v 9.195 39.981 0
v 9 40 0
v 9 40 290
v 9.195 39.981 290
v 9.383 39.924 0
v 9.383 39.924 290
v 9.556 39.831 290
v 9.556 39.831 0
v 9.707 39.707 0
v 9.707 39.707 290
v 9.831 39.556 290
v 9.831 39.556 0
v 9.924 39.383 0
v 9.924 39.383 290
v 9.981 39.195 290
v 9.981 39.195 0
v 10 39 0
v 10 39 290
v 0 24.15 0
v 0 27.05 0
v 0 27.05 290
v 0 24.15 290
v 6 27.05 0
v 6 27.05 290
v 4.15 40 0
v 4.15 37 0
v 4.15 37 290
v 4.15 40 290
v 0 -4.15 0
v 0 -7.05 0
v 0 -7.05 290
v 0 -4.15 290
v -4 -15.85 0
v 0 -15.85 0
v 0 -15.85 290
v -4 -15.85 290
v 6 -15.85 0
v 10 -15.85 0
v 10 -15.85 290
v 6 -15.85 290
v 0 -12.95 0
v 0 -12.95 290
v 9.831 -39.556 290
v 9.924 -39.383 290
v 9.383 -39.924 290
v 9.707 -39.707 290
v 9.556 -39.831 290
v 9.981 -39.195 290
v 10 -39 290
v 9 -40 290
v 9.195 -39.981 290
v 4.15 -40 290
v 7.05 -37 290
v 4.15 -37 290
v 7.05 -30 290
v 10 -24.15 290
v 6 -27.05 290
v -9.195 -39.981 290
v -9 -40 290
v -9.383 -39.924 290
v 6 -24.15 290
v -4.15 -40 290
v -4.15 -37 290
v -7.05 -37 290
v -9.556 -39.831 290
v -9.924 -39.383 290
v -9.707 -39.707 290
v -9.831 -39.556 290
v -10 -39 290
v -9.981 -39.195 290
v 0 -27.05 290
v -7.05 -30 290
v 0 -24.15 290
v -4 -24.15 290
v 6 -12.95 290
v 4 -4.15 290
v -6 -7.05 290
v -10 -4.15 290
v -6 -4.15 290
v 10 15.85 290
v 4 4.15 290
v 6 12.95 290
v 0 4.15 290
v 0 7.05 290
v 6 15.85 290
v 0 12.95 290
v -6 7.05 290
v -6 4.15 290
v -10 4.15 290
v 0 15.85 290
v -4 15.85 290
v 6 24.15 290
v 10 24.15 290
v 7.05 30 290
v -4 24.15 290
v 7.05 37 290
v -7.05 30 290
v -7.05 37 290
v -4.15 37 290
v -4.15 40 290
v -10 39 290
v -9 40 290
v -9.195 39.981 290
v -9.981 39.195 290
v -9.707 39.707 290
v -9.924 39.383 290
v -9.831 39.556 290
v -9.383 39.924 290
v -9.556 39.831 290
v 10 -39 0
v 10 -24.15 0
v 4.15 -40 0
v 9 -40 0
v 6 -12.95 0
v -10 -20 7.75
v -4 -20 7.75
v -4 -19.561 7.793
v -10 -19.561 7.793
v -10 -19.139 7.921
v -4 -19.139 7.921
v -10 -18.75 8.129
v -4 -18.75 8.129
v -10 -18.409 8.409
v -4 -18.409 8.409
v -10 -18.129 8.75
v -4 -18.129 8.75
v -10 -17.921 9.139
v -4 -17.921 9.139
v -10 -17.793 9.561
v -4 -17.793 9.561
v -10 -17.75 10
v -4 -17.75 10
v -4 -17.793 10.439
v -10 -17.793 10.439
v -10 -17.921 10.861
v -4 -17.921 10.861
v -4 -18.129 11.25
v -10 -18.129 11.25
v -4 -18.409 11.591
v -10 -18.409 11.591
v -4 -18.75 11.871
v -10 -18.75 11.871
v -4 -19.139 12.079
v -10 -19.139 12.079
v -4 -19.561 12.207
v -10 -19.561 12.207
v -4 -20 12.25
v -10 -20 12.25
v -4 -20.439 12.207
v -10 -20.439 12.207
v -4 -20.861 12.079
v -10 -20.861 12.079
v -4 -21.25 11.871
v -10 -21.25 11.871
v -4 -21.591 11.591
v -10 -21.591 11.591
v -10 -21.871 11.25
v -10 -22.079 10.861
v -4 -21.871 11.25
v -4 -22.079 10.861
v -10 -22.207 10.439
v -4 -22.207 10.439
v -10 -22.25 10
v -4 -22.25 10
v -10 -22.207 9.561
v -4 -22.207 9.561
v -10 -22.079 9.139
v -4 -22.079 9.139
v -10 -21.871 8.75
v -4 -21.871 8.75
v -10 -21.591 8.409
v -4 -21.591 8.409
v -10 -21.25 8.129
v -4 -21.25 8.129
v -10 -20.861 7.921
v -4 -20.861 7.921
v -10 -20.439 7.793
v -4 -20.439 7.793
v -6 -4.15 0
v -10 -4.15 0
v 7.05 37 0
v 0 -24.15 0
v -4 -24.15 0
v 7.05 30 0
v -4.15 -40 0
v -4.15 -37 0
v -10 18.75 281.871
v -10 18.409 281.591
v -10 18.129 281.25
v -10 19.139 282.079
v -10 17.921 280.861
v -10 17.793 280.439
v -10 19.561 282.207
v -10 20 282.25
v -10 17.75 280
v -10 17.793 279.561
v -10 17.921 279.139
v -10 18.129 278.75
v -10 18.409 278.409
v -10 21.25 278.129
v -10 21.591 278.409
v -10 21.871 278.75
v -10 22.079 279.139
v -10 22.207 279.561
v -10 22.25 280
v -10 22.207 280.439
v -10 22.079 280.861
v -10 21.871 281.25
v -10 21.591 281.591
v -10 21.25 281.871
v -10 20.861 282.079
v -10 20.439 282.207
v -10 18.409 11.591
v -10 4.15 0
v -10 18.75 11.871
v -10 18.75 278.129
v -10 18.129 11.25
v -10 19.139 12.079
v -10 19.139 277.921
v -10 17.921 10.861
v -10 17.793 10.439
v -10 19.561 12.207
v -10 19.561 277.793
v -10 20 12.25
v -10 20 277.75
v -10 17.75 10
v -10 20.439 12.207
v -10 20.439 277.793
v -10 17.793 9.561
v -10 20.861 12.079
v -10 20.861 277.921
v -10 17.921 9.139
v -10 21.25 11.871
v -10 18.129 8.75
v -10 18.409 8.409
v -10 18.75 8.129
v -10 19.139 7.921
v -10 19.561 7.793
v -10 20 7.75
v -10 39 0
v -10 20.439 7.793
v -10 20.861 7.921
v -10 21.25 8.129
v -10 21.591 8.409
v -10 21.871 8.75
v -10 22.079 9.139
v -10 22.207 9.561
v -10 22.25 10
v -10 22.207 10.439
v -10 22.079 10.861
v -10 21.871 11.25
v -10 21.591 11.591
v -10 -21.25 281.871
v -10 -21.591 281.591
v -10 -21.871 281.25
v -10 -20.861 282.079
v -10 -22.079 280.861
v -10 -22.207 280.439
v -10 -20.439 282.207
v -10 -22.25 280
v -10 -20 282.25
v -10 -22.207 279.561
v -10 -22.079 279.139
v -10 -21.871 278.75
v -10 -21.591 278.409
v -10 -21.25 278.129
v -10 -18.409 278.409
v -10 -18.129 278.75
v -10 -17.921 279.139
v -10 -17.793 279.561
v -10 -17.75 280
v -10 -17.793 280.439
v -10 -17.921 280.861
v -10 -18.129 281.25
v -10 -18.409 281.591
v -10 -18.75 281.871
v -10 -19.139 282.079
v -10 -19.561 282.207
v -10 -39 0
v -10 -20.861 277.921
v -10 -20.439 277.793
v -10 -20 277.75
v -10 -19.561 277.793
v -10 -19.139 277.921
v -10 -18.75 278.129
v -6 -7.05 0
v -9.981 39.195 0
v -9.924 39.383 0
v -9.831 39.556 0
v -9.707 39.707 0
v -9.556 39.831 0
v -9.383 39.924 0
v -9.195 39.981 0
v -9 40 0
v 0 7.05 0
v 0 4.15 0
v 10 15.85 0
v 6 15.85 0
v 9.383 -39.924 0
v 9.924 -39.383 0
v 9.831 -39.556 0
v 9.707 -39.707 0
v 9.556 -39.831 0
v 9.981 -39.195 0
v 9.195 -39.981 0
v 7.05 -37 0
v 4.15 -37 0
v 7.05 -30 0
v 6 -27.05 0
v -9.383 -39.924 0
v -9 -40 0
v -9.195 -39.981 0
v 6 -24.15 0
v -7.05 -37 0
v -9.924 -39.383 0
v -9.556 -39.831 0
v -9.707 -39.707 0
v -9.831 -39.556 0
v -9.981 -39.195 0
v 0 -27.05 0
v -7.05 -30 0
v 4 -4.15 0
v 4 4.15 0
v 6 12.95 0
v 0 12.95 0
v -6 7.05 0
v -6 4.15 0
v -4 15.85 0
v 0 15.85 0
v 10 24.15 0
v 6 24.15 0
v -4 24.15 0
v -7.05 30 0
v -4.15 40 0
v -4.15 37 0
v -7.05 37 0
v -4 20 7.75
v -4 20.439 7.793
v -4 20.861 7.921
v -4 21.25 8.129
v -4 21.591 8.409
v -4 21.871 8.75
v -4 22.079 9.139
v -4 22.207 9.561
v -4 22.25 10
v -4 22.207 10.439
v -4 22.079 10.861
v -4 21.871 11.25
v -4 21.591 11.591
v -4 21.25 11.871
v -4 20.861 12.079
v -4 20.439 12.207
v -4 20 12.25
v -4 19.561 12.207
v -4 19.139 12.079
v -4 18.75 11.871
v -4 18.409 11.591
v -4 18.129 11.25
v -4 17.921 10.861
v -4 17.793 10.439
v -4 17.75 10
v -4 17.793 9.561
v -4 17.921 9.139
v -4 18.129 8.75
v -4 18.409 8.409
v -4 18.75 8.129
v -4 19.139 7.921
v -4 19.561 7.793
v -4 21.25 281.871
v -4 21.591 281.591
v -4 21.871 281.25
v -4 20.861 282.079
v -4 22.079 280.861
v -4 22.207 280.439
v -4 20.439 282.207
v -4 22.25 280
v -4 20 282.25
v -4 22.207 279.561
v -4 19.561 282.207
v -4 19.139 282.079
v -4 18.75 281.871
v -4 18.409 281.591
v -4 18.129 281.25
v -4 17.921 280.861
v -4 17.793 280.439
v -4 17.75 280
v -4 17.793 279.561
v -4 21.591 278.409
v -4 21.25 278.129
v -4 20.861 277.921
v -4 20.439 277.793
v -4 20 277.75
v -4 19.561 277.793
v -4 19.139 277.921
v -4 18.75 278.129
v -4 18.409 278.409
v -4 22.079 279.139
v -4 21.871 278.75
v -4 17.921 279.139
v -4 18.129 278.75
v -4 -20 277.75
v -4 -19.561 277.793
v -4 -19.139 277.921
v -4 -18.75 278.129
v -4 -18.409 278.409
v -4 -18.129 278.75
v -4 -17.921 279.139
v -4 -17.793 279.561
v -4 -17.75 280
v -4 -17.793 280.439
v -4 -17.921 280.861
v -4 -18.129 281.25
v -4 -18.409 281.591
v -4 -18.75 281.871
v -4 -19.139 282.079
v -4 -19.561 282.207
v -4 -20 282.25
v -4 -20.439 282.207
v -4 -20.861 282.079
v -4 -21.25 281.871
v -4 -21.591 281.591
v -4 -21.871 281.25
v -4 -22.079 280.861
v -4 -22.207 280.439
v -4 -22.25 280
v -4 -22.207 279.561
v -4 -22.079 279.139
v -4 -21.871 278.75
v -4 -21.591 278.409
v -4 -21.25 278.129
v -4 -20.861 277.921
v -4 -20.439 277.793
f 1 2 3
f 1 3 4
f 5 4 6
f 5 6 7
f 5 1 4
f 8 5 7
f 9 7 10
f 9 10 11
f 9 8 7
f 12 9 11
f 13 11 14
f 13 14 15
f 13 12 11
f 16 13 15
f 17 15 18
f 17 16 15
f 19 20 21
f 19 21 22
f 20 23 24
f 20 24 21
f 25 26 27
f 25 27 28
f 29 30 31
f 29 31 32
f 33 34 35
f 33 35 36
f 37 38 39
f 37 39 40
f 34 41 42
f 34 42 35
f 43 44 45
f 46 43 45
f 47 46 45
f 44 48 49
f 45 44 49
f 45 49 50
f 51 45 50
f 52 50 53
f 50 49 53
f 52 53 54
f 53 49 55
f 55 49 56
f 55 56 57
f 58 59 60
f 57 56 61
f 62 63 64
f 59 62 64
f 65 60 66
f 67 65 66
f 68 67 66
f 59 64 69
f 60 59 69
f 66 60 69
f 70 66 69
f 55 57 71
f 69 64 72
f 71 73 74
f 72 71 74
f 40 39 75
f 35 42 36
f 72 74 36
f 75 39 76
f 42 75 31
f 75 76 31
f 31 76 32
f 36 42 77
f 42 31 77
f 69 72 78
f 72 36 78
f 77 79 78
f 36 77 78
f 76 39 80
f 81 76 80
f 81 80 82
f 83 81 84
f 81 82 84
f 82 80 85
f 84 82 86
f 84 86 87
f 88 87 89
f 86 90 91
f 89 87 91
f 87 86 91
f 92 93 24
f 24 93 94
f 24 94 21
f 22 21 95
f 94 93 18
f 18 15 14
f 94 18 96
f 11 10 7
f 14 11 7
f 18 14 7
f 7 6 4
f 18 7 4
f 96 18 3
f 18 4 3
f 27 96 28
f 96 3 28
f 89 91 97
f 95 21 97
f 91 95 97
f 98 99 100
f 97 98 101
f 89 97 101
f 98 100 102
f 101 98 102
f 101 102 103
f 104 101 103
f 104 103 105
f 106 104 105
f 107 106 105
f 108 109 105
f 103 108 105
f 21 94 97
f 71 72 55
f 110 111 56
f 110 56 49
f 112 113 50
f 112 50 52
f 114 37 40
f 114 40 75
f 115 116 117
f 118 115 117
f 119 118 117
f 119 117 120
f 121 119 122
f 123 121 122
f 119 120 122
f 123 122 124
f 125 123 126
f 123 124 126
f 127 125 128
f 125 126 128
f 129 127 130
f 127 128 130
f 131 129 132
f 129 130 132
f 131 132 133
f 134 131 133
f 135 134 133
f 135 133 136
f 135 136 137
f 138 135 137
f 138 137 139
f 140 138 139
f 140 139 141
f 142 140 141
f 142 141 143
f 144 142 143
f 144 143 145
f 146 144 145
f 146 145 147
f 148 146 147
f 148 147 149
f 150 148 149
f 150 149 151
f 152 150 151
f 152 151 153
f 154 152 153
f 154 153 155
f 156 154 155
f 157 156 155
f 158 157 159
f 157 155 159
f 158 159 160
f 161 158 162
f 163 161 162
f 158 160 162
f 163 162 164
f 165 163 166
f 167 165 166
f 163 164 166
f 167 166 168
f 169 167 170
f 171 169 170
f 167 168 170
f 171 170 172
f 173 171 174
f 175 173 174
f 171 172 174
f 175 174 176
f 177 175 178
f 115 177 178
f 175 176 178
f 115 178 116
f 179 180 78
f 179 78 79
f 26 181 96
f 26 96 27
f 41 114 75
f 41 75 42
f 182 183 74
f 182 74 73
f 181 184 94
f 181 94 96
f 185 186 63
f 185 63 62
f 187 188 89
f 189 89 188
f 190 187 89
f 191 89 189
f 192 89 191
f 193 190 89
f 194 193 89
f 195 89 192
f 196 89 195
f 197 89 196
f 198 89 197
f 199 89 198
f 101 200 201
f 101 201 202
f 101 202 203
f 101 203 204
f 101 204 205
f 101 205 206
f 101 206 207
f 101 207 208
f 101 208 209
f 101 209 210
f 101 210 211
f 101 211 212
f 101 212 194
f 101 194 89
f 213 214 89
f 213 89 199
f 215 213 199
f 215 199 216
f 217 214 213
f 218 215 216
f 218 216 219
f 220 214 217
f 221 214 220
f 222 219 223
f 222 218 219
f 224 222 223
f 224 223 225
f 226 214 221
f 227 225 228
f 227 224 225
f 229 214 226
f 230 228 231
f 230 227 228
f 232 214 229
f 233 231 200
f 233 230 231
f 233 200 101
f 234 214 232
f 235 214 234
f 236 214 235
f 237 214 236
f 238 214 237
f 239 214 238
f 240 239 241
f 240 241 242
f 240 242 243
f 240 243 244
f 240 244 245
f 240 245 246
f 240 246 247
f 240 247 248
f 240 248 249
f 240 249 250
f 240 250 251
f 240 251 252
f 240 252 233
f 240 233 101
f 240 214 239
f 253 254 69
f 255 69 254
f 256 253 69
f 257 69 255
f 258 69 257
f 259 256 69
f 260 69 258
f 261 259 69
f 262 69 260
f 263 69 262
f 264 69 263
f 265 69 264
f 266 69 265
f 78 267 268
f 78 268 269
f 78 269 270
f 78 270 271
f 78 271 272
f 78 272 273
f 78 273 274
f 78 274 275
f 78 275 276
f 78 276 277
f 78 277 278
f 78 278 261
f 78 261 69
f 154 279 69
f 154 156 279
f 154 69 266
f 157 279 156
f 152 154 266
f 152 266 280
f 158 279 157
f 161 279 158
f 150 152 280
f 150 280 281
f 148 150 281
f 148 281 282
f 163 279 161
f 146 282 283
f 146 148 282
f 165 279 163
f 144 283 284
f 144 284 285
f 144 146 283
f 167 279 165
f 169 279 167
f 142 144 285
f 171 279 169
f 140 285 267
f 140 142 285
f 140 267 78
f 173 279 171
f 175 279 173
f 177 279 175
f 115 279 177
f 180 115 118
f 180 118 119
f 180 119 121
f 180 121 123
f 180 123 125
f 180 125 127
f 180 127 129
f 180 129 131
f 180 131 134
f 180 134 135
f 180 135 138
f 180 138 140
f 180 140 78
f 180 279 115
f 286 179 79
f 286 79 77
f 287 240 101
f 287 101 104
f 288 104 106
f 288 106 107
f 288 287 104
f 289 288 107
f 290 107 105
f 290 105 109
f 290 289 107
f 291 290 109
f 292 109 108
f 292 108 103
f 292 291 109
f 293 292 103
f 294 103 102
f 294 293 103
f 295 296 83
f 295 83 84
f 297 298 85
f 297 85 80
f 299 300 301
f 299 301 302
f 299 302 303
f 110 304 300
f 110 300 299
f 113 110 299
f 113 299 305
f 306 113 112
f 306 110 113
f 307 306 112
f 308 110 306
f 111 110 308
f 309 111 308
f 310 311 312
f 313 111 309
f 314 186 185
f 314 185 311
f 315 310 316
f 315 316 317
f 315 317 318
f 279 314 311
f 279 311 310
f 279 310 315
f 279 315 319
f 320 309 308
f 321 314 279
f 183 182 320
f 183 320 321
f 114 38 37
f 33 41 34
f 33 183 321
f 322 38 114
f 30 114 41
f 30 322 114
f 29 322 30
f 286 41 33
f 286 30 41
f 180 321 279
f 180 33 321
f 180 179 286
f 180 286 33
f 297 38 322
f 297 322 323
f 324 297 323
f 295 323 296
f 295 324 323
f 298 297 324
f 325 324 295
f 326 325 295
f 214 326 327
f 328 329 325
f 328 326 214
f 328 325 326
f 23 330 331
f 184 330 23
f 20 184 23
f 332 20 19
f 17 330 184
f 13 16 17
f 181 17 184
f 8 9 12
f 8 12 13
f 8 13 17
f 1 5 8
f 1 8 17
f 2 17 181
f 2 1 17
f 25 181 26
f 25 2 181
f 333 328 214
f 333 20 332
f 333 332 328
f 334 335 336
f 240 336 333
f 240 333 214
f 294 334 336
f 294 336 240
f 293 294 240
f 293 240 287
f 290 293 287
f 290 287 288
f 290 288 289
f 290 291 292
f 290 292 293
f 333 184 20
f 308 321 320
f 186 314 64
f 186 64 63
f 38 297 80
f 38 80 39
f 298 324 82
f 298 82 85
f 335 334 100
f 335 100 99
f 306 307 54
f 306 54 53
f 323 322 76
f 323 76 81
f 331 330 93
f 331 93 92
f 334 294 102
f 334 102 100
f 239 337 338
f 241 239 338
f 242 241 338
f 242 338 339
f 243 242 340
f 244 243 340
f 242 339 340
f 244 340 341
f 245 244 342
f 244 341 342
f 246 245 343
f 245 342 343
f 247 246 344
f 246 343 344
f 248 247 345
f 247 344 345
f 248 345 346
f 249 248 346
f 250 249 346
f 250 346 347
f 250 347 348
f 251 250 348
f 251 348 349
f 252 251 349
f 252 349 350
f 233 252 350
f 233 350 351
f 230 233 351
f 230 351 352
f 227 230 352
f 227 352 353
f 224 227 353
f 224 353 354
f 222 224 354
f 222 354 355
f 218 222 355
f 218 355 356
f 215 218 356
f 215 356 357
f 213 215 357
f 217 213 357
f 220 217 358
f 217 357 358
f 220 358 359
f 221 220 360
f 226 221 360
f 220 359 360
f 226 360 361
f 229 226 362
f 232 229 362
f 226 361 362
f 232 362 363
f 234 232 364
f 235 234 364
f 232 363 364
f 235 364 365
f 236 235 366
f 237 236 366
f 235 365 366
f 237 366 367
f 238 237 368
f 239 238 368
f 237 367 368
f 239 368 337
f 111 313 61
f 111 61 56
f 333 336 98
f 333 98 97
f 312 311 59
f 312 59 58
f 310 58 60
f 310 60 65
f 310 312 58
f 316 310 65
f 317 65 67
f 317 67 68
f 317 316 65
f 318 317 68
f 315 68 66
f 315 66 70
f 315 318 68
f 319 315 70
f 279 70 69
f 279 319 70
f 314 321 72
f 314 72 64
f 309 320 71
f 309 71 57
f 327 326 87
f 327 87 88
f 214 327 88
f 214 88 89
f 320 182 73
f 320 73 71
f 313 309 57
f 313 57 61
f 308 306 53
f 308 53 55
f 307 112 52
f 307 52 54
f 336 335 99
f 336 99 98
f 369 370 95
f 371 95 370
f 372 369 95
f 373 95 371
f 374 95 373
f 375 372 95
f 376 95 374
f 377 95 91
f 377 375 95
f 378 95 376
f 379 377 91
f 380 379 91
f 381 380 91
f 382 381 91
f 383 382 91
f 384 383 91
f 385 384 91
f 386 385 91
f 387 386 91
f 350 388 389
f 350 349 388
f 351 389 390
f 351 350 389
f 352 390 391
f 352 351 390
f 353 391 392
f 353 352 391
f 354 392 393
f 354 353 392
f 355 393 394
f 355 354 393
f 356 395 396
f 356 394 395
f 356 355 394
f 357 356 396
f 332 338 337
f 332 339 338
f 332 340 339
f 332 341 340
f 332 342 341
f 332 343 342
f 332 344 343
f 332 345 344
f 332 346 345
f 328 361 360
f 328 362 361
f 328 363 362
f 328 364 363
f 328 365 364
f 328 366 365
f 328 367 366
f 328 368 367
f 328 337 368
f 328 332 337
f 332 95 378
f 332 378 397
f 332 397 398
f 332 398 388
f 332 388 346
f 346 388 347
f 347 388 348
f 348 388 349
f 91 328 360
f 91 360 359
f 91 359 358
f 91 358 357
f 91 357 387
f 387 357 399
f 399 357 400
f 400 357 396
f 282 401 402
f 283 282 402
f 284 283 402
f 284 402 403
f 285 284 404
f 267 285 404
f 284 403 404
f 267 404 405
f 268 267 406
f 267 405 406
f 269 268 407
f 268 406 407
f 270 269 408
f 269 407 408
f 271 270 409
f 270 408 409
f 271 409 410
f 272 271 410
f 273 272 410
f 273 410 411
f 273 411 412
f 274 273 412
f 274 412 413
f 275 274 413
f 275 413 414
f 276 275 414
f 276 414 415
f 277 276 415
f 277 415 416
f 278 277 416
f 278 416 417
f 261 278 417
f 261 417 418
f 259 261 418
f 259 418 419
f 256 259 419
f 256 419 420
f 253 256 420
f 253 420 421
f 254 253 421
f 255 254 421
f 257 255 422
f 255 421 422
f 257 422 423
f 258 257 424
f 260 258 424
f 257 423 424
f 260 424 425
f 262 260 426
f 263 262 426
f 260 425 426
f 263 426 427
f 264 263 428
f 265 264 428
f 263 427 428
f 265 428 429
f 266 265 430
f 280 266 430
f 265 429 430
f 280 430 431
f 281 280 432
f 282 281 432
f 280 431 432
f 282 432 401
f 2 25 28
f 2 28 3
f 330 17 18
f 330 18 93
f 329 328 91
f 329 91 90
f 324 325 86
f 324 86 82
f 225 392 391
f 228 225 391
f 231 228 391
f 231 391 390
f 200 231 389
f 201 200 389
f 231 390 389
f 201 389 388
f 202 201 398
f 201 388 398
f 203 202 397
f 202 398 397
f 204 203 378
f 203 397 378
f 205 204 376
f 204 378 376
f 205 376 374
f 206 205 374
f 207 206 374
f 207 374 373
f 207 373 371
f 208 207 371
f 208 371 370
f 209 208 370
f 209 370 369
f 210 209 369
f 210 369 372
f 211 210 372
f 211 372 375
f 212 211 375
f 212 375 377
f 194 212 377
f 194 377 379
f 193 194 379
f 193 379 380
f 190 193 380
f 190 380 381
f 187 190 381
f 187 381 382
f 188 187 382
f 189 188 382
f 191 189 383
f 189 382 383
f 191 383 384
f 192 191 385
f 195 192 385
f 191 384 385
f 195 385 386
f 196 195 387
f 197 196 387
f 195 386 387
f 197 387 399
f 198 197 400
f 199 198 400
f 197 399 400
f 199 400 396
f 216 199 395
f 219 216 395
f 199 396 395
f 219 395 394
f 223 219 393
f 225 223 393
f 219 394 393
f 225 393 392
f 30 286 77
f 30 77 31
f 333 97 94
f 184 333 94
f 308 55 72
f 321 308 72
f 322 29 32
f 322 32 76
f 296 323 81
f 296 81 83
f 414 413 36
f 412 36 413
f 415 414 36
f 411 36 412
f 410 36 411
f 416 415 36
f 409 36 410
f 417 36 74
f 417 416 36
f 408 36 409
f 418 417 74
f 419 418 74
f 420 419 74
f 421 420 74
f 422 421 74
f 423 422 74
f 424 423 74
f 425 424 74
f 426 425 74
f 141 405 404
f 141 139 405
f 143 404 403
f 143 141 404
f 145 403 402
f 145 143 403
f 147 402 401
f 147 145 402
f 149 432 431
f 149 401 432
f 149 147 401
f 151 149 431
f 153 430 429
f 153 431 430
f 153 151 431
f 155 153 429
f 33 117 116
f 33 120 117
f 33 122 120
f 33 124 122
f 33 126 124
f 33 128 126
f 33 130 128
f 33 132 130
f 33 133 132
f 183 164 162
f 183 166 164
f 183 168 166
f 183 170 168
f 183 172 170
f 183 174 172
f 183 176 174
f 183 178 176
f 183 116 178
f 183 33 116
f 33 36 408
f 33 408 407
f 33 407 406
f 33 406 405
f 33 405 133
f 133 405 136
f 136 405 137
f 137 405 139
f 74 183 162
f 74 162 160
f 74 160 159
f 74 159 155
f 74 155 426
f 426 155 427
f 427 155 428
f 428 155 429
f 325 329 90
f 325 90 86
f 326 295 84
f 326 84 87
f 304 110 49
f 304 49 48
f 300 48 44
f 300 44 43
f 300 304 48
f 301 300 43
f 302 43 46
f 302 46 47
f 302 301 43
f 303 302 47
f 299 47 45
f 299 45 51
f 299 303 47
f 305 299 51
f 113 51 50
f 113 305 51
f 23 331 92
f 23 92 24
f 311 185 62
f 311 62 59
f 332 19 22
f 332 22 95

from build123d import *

# Parameters (mm, degrees)
EXTRUDE_1_DEPTH         = 290
HOLE_WIZARD_4_5_4_5_1_D = 4.5
HOLE_WIZARD_4_5_4_5_2_D = 4.5
HOLE_WIZARD_4_5_4_5_3_D = 4.5
HOLE_WIZARD_4_5_4_5_4_D = 4.5


with BuildPart() as part:
    # Sketch1 → 凸台-拉伸1 (new body)
    with BuildSketch(Plane.XY):
        with BuildLine():
            Line((-9, 40), (-4.15, 40))
            Line((-4.15, 40), (-4.15, 37))
            Line((-4.15, 37), (-7.05, 37))
            Line((-7.05, 37), (-7.05, 30))
            Line((-7.05, 30), (7.05, 30))
            Line((7.05, 30), (7.05, 37))
            Line((7.05, 37), (4.15, 37))
            Line((4.15, 37), (4.15, 40))
            Line((4.15, 40), (9, 40))
            ThreePointArc((9, 40), (9.707106781, 39.707106781), (10, 39))
            Line((10, 39), (10, 24.15))
            Line((10, 24.15), (6, 24.15))
            Line((6, 24.15), (6, 27.05))
            Line((6, 27.05), (0, 27.05))
            Line((0, 27.05), (0, 24.15))
            Line((0, 24.15), (-4, 24.15))
            Line((-4, 24.15), (-4, 15.85))
            Line((-4, 15.85), (0, 15.85))
            Line((0, 15.85), (0, 12.95))
            Line((0, 12.95), (6, 12.95))
            Line((6, 12.95), (6, 15.85))
            Line((6, 15.85), (10, 15.85))
            Line((10, 15.85), (10, -15.85))
            Line((10, -15.85), (6, -15.85))
            Line((6, -15.85), (6, -12.95))
            Line((6, -12.95), (0, -12.95))
            Line((0, -12.95), (0, -15.85))
            Line((0, -15.85), (-4, -15.85))
            Line((-4, -15.85), (-4, -24.15))
            Line((-4, -24.15), (0, -24.15))
            Line((0, -24.15), (0, -27.05))
            Line((0, -27.05), (6, -27.05))
            Line((6, -27.05), (6, -24.15))
            Line((6, -24.15), (10, -24.15))
            Line((10, -24.15), (10, -39))
            ThreePointArc((10, -39), (9.707106781, -39.707106781), (9, -40))
            Line((9, -40), (4.15, -40))
            Line((4.15, -40), (4.15, -37))
            Line((4.15, -37), (7.05, -37))
            Line((7.05, -37), (7.05, -30))
            Line((7.05, -30), (-7.05, -30))
            Line((-7.05, -30), (-7.05, -37))
            Line((-7.05, -37), (-4.15, -37))
            Line((-4.15, -37), (-4.15, -40))
            Line((-4.15, -40), (-9, -40))
            ThreePointArc((-9, -40), (-9.707106781, -39.707106781), (-10, -39))
            Line((-10, -39), (-10, -4.15))
            Line((-10, -4.15), (-6, -4.15))
            Line((-6, -4.15), (-6, -7.05))
            Line((-6, -7.05), (0, -7.05))
            Line((0, -7.05), (0, -4.15))
            Line((0, -4.15), (4, -4.15))
            Line((4, -4.15), (4, 4.15))
            Line((4, 4.15), (0, 4.15))
            Line((0, 4.15), (0, 7.05))
            Line((0, 7.05), (-6, 7.05))
            Line((-6, 7.05), (-6, 4.15))
            Line((-6, 4.15), (-10, 4.15))
            Line((-10, 4.15), (-10, 39))
            ThreePointArc((-10, 39), (-9.707106781, 39.707106781), (-9, 40))
        make_face()
    extrude(amount=EXTRUDE_1_DEPTH)

    # Ø4.5 (4.5) 直径孔1 (through all)
    with Locations(Plane.ZY.offset(10)):
        with Locations((10, 20)):
            Hole(HOLE_WIZARD_4_5_4_5_1_D / 2)

    # Ø4.5 (4.5) 直径孔2 (through all)
    with Locations(Plane.ZY.offset(10)):
        with Locations((280, 20)):
            Hole(HOLE_WIZARD_4_5_4_5_2_D / 2)

    # Ø4.5 (4.5) 直径孔3 (through all)
    with Locations(Plane.ZY.offset(10)):
        with Locations((10, -20)):
            Hole(HOLE_WIZARD_4_5_4_5_3_D / 2)

    # Ø4.5 (4.5) 直径孔4 (through all)
    with Locations(Plane.ZY.offset(10)):
        with Locations((280, -20)):
            Hole(HOLE_WIZARD_4_5_4_5_4_D / 2)


solid = part.part
